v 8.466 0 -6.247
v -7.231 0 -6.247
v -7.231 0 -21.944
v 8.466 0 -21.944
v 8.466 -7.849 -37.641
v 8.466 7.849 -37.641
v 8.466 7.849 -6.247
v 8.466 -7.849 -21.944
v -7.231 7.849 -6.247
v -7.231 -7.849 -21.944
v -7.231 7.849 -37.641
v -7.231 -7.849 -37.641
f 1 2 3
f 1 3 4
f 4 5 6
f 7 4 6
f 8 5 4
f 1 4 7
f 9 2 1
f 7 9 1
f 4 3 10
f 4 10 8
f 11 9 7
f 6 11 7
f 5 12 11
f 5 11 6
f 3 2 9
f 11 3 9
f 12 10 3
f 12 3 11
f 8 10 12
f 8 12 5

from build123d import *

# Parameters (mm, degrees)
F0_W     = 15.6972
F0_H     = 15.6972
F1_DEPTH = 7.8486
F2_DEPTH = 7.8486


with BuildPart() as f1:
    # F0 (on Front) → F1 (new body)
    with BuildSketch(Plane.XZ):
        with Locations((0.617838, -29.792661)):
            Rectangle(F0_W, F0_H)
    extrude(amount=F1_DEPTH)

    # F0 (on Front) → F2 (join)
    with BuildSketch(Plane.XZ):
        with Locations((0.617838, -14.095461)):
            Rectangle(F0_W, F0_H)
        with Locations((0.617838, -29.792661)):
            Rectangle(F0_W, F0_H)
    extrude(amount=-F2_DEPTH)


solid = f1.part
